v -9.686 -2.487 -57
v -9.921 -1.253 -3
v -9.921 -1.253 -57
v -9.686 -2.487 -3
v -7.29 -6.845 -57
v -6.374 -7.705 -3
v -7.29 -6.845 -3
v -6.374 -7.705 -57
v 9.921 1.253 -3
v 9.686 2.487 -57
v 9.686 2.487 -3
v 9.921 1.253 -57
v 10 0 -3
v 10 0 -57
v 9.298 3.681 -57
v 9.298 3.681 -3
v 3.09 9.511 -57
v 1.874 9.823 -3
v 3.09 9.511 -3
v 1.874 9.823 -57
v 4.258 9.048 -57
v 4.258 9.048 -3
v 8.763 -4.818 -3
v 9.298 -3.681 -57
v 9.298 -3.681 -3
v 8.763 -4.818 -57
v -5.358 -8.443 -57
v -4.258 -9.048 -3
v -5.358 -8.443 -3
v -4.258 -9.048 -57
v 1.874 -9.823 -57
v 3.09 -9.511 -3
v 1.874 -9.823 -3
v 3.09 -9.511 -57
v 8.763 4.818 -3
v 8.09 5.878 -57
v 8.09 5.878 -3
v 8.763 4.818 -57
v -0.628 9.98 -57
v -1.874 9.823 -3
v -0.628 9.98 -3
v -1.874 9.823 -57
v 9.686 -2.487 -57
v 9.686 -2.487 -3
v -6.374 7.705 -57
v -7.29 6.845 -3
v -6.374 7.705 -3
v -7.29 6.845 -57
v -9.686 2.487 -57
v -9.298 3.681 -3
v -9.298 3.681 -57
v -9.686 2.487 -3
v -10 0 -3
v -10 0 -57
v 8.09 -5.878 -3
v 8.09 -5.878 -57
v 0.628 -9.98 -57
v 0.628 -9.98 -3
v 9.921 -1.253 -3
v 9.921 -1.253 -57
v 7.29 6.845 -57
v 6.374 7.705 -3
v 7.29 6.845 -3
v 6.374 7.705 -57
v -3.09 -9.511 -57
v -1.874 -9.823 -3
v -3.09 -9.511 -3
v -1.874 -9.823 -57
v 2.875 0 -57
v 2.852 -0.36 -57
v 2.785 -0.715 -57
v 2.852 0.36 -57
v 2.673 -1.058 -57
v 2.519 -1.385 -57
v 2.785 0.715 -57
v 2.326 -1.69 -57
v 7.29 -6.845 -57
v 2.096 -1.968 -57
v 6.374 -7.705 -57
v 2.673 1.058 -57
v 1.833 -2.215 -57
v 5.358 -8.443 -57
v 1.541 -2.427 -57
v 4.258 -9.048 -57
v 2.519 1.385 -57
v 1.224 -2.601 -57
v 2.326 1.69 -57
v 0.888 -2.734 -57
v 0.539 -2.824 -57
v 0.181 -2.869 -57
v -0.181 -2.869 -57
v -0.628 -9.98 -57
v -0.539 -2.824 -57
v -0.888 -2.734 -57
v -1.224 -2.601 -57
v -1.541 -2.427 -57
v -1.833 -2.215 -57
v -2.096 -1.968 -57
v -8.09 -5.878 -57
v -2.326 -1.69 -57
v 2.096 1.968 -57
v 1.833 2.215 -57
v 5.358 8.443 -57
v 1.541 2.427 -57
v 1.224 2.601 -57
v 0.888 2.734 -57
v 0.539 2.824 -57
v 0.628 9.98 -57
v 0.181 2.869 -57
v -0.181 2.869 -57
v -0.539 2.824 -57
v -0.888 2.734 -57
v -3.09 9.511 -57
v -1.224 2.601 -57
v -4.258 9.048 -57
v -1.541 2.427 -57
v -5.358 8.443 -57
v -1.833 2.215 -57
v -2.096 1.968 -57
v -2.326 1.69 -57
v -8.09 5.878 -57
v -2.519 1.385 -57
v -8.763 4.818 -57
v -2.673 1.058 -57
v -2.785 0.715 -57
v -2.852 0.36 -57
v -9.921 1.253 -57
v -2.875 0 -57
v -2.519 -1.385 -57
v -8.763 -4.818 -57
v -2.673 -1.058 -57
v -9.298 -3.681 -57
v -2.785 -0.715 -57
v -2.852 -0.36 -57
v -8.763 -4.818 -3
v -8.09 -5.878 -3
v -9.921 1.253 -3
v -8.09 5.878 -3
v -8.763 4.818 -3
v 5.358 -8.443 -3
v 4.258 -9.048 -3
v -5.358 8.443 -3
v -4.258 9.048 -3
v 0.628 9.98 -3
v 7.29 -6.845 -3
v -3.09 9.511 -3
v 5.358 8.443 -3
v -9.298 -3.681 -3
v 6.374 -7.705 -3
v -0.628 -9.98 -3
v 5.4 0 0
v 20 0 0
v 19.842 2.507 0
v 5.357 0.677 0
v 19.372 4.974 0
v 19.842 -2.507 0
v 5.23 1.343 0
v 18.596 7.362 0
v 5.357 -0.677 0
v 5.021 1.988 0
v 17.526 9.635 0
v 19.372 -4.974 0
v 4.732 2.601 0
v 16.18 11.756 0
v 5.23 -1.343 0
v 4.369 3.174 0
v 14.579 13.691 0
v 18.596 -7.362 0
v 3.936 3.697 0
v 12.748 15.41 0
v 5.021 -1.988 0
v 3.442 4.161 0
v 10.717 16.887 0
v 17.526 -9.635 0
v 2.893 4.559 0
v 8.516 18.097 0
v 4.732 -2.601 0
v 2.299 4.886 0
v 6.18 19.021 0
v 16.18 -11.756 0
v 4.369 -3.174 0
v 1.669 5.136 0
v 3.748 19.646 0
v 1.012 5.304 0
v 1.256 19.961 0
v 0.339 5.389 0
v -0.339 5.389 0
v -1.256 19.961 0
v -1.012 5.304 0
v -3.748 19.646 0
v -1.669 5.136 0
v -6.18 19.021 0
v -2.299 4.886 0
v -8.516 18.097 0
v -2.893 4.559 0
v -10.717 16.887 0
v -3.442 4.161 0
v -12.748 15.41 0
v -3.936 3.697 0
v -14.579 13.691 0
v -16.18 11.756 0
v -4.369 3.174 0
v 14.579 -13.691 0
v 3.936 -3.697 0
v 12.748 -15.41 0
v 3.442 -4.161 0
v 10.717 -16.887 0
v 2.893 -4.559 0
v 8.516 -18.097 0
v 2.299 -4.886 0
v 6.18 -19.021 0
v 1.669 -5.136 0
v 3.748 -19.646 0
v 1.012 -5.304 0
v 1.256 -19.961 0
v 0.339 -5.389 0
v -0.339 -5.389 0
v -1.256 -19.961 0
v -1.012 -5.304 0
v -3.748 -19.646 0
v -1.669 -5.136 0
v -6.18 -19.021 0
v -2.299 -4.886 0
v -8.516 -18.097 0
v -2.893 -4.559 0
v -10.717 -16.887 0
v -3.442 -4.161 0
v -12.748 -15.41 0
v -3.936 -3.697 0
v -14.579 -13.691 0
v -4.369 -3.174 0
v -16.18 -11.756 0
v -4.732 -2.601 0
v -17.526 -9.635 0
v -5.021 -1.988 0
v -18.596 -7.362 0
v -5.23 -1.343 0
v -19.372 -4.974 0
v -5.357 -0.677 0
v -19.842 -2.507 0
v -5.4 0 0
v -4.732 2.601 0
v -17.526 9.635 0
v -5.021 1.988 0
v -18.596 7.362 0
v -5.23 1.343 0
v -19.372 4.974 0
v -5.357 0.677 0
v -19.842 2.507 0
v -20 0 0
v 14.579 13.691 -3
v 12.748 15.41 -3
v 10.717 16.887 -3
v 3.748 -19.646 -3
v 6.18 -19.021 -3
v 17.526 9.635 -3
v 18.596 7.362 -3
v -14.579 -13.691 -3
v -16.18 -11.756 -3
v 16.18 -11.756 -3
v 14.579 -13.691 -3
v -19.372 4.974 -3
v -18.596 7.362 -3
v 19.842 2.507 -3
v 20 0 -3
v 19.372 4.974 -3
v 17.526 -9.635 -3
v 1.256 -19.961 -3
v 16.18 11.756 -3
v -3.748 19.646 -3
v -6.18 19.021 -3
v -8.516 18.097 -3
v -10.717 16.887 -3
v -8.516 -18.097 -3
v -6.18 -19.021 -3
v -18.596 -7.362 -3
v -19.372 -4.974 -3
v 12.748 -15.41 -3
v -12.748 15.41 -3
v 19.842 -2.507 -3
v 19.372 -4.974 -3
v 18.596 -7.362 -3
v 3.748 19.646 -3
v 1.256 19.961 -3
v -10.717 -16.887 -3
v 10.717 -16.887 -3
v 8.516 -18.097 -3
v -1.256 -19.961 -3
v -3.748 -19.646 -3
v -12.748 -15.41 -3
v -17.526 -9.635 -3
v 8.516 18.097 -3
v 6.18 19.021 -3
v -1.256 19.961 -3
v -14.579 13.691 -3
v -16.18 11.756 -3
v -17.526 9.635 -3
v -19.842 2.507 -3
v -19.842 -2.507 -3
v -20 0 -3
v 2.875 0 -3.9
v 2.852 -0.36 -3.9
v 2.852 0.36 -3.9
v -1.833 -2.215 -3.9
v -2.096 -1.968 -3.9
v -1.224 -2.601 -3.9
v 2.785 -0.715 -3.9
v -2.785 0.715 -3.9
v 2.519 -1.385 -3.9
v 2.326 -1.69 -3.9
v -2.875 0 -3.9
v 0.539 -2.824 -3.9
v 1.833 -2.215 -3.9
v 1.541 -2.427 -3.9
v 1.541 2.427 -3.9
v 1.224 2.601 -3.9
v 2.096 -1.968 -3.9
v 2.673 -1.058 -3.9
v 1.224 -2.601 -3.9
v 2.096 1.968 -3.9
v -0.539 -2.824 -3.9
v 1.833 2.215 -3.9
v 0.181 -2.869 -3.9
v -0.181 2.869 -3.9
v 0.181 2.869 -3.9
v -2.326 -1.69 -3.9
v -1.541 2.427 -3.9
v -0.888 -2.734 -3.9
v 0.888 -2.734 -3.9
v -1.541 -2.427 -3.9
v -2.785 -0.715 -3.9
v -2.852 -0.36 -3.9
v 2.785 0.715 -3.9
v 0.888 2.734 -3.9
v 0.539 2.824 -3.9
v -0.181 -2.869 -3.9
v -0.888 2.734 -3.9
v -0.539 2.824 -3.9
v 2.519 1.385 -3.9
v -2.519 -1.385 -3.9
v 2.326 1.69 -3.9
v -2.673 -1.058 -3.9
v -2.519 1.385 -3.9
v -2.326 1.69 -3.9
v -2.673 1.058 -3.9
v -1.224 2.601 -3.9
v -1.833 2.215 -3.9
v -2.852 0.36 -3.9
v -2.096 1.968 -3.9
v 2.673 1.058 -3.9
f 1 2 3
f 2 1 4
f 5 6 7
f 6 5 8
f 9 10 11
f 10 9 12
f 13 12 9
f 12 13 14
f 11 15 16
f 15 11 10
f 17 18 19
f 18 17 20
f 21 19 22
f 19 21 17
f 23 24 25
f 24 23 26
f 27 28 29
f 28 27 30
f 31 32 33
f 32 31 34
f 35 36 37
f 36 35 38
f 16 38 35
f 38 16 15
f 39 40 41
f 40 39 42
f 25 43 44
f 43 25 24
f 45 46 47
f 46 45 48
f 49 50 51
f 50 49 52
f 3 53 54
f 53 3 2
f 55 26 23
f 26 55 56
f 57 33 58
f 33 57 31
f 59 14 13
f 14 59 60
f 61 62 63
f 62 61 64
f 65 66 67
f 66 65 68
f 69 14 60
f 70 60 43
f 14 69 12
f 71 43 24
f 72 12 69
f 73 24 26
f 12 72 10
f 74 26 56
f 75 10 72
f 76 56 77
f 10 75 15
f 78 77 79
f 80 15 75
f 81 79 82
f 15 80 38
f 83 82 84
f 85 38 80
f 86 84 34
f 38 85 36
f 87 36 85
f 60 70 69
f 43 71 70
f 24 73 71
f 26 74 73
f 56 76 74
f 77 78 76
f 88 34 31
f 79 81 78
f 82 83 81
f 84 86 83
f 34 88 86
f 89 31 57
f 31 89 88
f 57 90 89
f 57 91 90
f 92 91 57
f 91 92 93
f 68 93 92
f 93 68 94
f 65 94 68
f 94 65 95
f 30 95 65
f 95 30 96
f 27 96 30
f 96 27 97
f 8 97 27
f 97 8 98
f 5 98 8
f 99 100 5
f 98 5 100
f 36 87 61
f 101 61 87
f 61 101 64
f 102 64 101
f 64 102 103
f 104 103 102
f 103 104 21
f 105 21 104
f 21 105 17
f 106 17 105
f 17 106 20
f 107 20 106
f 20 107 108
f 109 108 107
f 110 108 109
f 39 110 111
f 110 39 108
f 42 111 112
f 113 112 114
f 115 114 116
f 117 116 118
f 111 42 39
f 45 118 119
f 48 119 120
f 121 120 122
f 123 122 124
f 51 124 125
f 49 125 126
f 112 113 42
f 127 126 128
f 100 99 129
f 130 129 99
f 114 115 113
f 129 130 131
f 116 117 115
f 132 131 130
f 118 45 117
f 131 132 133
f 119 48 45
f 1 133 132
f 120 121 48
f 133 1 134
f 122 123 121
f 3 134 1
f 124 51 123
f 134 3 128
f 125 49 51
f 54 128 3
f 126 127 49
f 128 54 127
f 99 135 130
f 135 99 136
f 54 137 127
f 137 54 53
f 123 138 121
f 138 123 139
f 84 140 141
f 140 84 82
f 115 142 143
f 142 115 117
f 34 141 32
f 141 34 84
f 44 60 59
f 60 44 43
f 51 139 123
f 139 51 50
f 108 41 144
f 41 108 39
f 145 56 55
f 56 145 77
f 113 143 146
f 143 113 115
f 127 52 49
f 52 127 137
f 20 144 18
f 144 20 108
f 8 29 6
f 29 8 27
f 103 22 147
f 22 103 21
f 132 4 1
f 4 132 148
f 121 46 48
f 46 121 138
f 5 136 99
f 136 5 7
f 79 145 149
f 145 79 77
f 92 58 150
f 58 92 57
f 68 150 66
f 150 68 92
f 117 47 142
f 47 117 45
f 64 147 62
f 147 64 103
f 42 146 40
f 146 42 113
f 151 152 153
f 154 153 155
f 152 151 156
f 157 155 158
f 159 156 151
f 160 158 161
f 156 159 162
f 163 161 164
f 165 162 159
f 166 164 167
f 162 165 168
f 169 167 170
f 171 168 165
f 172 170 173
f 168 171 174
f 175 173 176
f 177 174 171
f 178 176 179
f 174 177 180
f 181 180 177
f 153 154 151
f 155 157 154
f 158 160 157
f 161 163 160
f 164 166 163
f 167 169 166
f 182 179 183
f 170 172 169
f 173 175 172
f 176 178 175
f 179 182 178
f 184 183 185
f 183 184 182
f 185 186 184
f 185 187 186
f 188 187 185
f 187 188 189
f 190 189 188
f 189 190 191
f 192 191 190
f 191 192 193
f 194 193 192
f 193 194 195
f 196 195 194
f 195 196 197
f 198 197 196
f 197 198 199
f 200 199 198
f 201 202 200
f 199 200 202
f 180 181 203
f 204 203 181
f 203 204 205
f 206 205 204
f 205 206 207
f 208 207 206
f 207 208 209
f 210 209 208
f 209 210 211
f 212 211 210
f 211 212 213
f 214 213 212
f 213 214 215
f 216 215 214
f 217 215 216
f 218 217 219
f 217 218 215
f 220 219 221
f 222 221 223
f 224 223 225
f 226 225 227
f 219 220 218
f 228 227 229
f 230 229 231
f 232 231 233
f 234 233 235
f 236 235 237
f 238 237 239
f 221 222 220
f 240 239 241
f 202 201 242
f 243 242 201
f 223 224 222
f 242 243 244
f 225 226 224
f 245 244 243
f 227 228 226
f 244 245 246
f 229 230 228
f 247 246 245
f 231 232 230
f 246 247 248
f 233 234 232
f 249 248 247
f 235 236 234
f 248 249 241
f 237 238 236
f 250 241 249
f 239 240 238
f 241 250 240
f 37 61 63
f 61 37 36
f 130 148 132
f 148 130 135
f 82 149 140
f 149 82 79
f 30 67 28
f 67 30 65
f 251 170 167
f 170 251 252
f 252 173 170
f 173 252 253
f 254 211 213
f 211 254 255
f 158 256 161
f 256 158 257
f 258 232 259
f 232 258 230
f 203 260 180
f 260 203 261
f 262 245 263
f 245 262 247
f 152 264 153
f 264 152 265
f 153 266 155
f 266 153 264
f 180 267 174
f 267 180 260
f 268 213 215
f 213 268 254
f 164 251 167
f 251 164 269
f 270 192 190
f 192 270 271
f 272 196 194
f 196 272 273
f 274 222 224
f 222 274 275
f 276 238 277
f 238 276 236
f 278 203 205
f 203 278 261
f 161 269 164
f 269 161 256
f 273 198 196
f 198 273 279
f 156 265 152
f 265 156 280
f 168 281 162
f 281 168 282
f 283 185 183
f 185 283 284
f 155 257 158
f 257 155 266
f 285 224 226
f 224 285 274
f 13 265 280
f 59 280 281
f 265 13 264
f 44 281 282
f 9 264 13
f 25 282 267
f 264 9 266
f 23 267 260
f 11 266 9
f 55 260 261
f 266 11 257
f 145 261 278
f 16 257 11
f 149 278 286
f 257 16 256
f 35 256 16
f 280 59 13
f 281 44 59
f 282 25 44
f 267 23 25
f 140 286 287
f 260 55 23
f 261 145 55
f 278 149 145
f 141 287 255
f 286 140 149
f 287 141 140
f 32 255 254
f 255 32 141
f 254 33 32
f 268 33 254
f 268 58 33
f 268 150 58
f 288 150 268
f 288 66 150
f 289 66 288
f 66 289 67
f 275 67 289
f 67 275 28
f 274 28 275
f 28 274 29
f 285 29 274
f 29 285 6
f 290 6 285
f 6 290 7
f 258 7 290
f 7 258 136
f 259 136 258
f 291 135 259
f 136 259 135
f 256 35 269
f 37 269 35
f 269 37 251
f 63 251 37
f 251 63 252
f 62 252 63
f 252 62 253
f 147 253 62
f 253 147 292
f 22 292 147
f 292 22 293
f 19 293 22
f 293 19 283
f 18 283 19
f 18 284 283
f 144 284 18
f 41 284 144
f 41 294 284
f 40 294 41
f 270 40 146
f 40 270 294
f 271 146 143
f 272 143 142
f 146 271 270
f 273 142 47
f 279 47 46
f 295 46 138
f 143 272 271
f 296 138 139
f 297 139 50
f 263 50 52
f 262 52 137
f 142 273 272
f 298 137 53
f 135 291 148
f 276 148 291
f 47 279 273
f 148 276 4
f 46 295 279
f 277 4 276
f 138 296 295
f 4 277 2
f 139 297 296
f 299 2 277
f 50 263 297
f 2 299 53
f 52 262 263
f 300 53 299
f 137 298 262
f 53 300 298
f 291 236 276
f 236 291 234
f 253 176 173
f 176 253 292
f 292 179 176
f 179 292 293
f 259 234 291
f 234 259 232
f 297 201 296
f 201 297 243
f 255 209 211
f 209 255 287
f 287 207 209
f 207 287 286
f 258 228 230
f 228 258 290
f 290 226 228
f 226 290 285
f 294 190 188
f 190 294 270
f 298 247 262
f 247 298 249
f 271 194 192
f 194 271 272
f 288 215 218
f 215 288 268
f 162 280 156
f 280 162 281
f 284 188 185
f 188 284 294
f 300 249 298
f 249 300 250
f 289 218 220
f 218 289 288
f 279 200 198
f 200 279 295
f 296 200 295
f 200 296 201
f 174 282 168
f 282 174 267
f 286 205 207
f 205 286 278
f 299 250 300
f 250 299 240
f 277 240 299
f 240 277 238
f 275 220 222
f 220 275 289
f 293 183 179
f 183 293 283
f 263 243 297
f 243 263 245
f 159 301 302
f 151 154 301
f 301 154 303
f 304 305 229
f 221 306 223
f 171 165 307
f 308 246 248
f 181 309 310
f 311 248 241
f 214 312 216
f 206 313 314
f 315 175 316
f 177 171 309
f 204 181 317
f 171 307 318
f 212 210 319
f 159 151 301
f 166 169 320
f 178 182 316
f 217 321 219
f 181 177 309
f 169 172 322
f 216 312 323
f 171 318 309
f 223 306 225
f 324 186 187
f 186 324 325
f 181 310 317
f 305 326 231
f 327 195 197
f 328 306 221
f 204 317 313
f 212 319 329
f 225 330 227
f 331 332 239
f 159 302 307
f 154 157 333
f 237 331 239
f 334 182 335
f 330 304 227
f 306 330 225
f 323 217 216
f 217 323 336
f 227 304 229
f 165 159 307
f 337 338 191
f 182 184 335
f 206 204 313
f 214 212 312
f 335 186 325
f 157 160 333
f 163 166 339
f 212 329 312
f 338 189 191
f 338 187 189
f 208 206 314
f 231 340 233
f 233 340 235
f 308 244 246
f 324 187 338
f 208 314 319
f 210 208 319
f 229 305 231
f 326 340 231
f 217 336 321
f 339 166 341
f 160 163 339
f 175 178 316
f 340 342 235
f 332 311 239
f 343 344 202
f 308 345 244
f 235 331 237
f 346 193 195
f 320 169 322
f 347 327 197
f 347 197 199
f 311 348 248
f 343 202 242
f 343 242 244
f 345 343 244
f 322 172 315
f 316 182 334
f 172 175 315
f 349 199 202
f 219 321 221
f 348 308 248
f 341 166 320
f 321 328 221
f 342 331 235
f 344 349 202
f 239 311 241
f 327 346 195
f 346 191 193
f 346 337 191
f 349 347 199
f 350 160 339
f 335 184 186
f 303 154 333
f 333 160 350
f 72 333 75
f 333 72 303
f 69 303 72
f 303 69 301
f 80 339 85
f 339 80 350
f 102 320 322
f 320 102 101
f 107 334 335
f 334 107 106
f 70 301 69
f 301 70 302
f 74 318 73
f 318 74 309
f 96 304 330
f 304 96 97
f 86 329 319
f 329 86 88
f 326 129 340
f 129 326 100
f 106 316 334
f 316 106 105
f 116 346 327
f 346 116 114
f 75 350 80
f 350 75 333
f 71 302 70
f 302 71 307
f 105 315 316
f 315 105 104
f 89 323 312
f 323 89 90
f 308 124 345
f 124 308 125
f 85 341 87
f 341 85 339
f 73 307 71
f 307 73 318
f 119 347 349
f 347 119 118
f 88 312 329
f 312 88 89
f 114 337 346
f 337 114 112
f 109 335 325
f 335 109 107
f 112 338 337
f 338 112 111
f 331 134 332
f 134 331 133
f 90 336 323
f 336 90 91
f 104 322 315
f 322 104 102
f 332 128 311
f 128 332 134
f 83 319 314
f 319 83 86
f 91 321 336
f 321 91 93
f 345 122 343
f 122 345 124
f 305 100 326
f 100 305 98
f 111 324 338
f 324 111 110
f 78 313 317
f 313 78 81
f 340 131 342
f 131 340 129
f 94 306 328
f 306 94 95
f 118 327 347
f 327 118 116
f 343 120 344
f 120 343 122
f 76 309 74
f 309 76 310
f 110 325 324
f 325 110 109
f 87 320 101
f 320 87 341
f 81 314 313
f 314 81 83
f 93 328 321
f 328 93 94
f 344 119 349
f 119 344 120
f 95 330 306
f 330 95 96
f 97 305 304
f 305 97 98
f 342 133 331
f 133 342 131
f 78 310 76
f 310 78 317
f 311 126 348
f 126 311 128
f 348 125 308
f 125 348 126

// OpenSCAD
$fn = 50;


difference() {
	union() {
		translate(v = [0, 0, -57.0000000000]) {
			cylinder(h = 57, r = 10.0000000000);
		}
		translate(v = [0, 0, -3.0000000000]) {
			cylinder(h = 3, r = 20.0000000000);
		}
	}
	union() {
		translate(v = [0, 0, 0]) {
			rotate(a = [0, 0, 0]) {
				difference() {
					union() {
						#translate(v = [0, 0, -57.0000000000]) {
							cylinder(h = 57, r = 2.6000000000);
						}
						#translate(v = [0, 0, -3.9000000000]) {
							cylinder(h = 3.9000000000, r1 = 2.8750000000, r2 = 5.4000000000);
						}
						#translate(v = [0, 0, -57.0000000000]) {
							cylinder(h = 57, r = 2.8750000000);
						}
						#translate(v = [0, 0, -57.0000000000]) {
							cylinder(h = 57, r = 2.6000000000);
						}
					}
					union();
				}
			}
		}
	}
}
